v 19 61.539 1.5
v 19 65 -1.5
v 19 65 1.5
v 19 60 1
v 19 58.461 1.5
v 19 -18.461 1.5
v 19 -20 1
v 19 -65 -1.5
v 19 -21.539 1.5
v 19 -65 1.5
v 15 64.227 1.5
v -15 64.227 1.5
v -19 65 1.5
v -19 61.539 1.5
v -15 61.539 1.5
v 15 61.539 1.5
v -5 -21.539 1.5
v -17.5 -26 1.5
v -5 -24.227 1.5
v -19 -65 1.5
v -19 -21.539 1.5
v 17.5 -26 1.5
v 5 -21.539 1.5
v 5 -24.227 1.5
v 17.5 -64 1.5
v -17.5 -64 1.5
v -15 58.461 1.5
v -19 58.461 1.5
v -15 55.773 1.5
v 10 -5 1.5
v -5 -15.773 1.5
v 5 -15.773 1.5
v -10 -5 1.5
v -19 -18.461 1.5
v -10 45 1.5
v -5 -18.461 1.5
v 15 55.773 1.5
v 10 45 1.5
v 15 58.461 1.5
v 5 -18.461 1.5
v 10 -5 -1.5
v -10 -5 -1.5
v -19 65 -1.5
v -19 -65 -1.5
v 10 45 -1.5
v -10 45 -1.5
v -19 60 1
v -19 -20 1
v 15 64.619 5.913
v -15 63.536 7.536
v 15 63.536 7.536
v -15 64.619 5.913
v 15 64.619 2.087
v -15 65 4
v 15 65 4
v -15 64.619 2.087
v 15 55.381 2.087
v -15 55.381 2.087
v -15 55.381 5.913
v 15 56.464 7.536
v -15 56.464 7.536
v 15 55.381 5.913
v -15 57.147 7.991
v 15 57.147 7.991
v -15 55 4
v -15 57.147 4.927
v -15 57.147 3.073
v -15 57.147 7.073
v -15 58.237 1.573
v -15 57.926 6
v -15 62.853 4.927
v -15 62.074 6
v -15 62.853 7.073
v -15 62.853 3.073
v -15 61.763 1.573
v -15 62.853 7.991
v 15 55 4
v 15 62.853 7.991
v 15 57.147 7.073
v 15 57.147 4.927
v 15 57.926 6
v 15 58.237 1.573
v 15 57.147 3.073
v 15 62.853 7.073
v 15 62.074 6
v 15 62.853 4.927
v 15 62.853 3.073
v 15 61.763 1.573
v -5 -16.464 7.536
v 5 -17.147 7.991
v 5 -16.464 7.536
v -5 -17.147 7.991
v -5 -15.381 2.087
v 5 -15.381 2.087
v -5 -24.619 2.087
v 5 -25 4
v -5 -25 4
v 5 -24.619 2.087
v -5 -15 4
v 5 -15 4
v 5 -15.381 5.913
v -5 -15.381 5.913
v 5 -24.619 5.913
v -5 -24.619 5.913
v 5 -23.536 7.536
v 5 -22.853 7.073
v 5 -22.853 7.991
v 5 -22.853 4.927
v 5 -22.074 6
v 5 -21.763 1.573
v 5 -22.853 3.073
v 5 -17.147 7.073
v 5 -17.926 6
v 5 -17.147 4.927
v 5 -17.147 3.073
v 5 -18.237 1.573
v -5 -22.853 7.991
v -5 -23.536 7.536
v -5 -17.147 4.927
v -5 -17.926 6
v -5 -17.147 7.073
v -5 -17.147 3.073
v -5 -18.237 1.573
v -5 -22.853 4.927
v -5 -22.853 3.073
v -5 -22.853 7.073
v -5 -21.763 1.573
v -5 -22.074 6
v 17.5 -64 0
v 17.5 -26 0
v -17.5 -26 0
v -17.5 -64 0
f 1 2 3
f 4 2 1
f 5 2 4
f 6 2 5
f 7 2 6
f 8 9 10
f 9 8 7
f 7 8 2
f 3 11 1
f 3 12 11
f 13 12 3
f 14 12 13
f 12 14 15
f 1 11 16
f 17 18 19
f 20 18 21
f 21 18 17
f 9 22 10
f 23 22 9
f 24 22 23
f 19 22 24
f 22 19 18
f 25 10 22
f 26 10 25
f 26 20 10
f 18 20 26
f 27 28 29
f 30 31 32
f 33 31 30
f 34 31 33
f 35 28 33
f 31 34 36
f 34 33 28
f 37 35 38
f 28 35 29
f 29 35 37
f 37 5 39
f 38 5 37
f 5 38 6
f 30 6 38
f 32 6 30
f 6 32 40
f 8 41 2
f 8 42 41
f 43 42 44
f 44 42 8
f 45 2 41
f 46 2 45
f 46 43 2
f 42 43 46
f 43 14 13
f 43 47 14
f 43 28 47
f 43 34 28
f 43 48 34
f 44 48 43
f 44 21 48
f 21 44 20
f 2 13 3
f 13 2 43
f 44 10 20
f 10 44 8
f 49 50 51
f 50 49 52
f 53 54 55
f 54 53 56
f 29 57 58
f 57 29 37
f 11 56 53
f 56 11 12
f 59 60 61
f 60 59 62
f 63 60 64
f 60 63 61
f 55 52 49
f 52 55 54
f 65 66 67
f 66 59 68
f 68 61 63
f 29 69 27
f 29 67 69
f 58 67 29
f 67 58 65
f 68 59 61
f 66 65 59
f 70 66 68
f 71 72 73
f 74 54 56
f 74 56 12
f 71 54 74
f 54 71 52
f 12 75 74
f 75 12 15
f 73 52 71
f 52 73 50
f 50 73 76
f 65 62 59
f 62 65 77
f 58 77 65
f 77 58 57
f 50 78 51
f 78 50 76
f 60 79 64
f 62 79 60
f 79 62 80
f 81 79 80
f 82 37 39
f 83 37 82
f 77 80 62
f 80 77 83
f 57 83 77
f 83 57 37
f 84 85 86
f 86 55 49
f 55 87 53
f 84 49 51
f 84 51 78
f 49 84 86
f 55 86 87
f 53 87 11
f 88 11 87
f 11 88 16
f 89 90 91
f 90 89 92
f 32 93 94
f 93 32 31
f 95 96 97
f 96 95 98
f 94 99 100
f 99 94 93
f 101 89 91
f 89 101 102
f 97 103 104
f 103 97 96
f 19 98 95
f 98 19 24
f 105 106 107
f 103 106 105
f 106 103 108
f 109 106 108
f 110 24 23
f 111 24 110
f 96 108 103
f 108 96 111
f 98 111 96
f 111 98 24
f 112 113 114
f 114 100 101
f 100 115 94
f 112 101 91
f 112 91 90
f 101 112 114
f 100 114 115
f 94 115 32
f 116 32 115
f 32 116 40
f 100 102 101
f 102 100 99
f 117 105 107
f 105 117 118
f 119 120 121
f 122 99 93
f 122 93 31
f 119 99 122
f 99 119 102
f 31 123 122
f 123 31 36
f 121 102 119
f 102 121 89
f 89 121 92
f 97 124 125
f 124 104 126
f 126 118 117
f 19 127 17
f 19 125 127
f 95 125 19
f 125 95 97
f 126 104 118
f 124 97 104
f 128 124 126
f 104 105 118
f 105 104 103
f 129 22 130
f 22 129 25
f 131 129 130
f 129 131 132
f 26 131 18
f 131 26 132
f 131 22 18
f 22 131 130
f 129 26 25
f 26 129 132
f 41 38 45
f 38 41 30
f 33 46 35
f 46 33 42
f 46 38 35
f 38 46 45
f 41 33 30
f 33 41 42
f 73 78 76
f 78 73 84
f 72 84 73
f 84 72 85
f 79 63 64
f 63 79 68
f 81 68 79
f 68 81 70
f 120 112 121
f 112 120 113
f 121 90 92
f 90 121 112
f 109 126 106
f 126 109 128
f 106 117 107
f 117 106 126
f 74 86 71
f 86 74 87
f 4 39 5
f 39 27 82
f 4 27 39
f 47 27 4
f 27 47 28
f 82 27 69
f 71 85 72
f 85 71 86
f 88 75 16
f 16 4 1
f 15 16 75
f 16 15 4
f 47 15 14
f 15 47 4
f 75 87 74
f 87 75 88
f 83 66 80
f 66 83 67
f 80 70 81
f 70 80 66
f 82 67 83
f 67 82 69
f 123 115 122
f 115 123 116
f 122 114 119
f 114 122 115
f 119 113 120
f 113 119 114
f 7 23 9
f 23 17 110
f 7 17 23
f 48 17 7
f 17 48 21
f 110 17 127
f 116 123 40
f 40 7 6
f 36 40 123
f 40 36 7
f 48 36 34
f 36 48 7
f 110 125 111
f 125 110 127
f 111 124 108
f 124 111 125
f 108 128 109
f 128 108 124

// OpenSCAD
difference() {
    union(){
        cube([38, 130, 3], true);



        translate([0,60,4]){
            rotate([0,90,0]) {
                cylinder(30, 5, 5, true);
            }
        }

        translate([0,-20,4]){
            rotate([0,90,0]) {
                cylinder(10, 5, 5, true);
            }
        }
    }


    union() {
        
        translate([0,-45,19]){
            cube([35, 38, 38], true);
        }
        
        translate([0,20,0]){
            cube([20, 50, 25], true);
        }
        
        translate([0,60,8]){
            rotate([0,90,0]) {
                cylinder(100, 3, 3, true);
            }
        }


        translate([0,-20,8]){
            rotate([0,90,0]) {
                cylinder(100, 3, 3, true);
            }
        }
        
        

        translate([0,60,4]){
            rotate([0,90,0]) {
                cylinder(100, 3, 3, true);
            }
        }


        translate([0,-20,4]){
            rotate([0,90,0]) {
                cylinder(100, 3, 3, true);
            }
        }

    }
}
